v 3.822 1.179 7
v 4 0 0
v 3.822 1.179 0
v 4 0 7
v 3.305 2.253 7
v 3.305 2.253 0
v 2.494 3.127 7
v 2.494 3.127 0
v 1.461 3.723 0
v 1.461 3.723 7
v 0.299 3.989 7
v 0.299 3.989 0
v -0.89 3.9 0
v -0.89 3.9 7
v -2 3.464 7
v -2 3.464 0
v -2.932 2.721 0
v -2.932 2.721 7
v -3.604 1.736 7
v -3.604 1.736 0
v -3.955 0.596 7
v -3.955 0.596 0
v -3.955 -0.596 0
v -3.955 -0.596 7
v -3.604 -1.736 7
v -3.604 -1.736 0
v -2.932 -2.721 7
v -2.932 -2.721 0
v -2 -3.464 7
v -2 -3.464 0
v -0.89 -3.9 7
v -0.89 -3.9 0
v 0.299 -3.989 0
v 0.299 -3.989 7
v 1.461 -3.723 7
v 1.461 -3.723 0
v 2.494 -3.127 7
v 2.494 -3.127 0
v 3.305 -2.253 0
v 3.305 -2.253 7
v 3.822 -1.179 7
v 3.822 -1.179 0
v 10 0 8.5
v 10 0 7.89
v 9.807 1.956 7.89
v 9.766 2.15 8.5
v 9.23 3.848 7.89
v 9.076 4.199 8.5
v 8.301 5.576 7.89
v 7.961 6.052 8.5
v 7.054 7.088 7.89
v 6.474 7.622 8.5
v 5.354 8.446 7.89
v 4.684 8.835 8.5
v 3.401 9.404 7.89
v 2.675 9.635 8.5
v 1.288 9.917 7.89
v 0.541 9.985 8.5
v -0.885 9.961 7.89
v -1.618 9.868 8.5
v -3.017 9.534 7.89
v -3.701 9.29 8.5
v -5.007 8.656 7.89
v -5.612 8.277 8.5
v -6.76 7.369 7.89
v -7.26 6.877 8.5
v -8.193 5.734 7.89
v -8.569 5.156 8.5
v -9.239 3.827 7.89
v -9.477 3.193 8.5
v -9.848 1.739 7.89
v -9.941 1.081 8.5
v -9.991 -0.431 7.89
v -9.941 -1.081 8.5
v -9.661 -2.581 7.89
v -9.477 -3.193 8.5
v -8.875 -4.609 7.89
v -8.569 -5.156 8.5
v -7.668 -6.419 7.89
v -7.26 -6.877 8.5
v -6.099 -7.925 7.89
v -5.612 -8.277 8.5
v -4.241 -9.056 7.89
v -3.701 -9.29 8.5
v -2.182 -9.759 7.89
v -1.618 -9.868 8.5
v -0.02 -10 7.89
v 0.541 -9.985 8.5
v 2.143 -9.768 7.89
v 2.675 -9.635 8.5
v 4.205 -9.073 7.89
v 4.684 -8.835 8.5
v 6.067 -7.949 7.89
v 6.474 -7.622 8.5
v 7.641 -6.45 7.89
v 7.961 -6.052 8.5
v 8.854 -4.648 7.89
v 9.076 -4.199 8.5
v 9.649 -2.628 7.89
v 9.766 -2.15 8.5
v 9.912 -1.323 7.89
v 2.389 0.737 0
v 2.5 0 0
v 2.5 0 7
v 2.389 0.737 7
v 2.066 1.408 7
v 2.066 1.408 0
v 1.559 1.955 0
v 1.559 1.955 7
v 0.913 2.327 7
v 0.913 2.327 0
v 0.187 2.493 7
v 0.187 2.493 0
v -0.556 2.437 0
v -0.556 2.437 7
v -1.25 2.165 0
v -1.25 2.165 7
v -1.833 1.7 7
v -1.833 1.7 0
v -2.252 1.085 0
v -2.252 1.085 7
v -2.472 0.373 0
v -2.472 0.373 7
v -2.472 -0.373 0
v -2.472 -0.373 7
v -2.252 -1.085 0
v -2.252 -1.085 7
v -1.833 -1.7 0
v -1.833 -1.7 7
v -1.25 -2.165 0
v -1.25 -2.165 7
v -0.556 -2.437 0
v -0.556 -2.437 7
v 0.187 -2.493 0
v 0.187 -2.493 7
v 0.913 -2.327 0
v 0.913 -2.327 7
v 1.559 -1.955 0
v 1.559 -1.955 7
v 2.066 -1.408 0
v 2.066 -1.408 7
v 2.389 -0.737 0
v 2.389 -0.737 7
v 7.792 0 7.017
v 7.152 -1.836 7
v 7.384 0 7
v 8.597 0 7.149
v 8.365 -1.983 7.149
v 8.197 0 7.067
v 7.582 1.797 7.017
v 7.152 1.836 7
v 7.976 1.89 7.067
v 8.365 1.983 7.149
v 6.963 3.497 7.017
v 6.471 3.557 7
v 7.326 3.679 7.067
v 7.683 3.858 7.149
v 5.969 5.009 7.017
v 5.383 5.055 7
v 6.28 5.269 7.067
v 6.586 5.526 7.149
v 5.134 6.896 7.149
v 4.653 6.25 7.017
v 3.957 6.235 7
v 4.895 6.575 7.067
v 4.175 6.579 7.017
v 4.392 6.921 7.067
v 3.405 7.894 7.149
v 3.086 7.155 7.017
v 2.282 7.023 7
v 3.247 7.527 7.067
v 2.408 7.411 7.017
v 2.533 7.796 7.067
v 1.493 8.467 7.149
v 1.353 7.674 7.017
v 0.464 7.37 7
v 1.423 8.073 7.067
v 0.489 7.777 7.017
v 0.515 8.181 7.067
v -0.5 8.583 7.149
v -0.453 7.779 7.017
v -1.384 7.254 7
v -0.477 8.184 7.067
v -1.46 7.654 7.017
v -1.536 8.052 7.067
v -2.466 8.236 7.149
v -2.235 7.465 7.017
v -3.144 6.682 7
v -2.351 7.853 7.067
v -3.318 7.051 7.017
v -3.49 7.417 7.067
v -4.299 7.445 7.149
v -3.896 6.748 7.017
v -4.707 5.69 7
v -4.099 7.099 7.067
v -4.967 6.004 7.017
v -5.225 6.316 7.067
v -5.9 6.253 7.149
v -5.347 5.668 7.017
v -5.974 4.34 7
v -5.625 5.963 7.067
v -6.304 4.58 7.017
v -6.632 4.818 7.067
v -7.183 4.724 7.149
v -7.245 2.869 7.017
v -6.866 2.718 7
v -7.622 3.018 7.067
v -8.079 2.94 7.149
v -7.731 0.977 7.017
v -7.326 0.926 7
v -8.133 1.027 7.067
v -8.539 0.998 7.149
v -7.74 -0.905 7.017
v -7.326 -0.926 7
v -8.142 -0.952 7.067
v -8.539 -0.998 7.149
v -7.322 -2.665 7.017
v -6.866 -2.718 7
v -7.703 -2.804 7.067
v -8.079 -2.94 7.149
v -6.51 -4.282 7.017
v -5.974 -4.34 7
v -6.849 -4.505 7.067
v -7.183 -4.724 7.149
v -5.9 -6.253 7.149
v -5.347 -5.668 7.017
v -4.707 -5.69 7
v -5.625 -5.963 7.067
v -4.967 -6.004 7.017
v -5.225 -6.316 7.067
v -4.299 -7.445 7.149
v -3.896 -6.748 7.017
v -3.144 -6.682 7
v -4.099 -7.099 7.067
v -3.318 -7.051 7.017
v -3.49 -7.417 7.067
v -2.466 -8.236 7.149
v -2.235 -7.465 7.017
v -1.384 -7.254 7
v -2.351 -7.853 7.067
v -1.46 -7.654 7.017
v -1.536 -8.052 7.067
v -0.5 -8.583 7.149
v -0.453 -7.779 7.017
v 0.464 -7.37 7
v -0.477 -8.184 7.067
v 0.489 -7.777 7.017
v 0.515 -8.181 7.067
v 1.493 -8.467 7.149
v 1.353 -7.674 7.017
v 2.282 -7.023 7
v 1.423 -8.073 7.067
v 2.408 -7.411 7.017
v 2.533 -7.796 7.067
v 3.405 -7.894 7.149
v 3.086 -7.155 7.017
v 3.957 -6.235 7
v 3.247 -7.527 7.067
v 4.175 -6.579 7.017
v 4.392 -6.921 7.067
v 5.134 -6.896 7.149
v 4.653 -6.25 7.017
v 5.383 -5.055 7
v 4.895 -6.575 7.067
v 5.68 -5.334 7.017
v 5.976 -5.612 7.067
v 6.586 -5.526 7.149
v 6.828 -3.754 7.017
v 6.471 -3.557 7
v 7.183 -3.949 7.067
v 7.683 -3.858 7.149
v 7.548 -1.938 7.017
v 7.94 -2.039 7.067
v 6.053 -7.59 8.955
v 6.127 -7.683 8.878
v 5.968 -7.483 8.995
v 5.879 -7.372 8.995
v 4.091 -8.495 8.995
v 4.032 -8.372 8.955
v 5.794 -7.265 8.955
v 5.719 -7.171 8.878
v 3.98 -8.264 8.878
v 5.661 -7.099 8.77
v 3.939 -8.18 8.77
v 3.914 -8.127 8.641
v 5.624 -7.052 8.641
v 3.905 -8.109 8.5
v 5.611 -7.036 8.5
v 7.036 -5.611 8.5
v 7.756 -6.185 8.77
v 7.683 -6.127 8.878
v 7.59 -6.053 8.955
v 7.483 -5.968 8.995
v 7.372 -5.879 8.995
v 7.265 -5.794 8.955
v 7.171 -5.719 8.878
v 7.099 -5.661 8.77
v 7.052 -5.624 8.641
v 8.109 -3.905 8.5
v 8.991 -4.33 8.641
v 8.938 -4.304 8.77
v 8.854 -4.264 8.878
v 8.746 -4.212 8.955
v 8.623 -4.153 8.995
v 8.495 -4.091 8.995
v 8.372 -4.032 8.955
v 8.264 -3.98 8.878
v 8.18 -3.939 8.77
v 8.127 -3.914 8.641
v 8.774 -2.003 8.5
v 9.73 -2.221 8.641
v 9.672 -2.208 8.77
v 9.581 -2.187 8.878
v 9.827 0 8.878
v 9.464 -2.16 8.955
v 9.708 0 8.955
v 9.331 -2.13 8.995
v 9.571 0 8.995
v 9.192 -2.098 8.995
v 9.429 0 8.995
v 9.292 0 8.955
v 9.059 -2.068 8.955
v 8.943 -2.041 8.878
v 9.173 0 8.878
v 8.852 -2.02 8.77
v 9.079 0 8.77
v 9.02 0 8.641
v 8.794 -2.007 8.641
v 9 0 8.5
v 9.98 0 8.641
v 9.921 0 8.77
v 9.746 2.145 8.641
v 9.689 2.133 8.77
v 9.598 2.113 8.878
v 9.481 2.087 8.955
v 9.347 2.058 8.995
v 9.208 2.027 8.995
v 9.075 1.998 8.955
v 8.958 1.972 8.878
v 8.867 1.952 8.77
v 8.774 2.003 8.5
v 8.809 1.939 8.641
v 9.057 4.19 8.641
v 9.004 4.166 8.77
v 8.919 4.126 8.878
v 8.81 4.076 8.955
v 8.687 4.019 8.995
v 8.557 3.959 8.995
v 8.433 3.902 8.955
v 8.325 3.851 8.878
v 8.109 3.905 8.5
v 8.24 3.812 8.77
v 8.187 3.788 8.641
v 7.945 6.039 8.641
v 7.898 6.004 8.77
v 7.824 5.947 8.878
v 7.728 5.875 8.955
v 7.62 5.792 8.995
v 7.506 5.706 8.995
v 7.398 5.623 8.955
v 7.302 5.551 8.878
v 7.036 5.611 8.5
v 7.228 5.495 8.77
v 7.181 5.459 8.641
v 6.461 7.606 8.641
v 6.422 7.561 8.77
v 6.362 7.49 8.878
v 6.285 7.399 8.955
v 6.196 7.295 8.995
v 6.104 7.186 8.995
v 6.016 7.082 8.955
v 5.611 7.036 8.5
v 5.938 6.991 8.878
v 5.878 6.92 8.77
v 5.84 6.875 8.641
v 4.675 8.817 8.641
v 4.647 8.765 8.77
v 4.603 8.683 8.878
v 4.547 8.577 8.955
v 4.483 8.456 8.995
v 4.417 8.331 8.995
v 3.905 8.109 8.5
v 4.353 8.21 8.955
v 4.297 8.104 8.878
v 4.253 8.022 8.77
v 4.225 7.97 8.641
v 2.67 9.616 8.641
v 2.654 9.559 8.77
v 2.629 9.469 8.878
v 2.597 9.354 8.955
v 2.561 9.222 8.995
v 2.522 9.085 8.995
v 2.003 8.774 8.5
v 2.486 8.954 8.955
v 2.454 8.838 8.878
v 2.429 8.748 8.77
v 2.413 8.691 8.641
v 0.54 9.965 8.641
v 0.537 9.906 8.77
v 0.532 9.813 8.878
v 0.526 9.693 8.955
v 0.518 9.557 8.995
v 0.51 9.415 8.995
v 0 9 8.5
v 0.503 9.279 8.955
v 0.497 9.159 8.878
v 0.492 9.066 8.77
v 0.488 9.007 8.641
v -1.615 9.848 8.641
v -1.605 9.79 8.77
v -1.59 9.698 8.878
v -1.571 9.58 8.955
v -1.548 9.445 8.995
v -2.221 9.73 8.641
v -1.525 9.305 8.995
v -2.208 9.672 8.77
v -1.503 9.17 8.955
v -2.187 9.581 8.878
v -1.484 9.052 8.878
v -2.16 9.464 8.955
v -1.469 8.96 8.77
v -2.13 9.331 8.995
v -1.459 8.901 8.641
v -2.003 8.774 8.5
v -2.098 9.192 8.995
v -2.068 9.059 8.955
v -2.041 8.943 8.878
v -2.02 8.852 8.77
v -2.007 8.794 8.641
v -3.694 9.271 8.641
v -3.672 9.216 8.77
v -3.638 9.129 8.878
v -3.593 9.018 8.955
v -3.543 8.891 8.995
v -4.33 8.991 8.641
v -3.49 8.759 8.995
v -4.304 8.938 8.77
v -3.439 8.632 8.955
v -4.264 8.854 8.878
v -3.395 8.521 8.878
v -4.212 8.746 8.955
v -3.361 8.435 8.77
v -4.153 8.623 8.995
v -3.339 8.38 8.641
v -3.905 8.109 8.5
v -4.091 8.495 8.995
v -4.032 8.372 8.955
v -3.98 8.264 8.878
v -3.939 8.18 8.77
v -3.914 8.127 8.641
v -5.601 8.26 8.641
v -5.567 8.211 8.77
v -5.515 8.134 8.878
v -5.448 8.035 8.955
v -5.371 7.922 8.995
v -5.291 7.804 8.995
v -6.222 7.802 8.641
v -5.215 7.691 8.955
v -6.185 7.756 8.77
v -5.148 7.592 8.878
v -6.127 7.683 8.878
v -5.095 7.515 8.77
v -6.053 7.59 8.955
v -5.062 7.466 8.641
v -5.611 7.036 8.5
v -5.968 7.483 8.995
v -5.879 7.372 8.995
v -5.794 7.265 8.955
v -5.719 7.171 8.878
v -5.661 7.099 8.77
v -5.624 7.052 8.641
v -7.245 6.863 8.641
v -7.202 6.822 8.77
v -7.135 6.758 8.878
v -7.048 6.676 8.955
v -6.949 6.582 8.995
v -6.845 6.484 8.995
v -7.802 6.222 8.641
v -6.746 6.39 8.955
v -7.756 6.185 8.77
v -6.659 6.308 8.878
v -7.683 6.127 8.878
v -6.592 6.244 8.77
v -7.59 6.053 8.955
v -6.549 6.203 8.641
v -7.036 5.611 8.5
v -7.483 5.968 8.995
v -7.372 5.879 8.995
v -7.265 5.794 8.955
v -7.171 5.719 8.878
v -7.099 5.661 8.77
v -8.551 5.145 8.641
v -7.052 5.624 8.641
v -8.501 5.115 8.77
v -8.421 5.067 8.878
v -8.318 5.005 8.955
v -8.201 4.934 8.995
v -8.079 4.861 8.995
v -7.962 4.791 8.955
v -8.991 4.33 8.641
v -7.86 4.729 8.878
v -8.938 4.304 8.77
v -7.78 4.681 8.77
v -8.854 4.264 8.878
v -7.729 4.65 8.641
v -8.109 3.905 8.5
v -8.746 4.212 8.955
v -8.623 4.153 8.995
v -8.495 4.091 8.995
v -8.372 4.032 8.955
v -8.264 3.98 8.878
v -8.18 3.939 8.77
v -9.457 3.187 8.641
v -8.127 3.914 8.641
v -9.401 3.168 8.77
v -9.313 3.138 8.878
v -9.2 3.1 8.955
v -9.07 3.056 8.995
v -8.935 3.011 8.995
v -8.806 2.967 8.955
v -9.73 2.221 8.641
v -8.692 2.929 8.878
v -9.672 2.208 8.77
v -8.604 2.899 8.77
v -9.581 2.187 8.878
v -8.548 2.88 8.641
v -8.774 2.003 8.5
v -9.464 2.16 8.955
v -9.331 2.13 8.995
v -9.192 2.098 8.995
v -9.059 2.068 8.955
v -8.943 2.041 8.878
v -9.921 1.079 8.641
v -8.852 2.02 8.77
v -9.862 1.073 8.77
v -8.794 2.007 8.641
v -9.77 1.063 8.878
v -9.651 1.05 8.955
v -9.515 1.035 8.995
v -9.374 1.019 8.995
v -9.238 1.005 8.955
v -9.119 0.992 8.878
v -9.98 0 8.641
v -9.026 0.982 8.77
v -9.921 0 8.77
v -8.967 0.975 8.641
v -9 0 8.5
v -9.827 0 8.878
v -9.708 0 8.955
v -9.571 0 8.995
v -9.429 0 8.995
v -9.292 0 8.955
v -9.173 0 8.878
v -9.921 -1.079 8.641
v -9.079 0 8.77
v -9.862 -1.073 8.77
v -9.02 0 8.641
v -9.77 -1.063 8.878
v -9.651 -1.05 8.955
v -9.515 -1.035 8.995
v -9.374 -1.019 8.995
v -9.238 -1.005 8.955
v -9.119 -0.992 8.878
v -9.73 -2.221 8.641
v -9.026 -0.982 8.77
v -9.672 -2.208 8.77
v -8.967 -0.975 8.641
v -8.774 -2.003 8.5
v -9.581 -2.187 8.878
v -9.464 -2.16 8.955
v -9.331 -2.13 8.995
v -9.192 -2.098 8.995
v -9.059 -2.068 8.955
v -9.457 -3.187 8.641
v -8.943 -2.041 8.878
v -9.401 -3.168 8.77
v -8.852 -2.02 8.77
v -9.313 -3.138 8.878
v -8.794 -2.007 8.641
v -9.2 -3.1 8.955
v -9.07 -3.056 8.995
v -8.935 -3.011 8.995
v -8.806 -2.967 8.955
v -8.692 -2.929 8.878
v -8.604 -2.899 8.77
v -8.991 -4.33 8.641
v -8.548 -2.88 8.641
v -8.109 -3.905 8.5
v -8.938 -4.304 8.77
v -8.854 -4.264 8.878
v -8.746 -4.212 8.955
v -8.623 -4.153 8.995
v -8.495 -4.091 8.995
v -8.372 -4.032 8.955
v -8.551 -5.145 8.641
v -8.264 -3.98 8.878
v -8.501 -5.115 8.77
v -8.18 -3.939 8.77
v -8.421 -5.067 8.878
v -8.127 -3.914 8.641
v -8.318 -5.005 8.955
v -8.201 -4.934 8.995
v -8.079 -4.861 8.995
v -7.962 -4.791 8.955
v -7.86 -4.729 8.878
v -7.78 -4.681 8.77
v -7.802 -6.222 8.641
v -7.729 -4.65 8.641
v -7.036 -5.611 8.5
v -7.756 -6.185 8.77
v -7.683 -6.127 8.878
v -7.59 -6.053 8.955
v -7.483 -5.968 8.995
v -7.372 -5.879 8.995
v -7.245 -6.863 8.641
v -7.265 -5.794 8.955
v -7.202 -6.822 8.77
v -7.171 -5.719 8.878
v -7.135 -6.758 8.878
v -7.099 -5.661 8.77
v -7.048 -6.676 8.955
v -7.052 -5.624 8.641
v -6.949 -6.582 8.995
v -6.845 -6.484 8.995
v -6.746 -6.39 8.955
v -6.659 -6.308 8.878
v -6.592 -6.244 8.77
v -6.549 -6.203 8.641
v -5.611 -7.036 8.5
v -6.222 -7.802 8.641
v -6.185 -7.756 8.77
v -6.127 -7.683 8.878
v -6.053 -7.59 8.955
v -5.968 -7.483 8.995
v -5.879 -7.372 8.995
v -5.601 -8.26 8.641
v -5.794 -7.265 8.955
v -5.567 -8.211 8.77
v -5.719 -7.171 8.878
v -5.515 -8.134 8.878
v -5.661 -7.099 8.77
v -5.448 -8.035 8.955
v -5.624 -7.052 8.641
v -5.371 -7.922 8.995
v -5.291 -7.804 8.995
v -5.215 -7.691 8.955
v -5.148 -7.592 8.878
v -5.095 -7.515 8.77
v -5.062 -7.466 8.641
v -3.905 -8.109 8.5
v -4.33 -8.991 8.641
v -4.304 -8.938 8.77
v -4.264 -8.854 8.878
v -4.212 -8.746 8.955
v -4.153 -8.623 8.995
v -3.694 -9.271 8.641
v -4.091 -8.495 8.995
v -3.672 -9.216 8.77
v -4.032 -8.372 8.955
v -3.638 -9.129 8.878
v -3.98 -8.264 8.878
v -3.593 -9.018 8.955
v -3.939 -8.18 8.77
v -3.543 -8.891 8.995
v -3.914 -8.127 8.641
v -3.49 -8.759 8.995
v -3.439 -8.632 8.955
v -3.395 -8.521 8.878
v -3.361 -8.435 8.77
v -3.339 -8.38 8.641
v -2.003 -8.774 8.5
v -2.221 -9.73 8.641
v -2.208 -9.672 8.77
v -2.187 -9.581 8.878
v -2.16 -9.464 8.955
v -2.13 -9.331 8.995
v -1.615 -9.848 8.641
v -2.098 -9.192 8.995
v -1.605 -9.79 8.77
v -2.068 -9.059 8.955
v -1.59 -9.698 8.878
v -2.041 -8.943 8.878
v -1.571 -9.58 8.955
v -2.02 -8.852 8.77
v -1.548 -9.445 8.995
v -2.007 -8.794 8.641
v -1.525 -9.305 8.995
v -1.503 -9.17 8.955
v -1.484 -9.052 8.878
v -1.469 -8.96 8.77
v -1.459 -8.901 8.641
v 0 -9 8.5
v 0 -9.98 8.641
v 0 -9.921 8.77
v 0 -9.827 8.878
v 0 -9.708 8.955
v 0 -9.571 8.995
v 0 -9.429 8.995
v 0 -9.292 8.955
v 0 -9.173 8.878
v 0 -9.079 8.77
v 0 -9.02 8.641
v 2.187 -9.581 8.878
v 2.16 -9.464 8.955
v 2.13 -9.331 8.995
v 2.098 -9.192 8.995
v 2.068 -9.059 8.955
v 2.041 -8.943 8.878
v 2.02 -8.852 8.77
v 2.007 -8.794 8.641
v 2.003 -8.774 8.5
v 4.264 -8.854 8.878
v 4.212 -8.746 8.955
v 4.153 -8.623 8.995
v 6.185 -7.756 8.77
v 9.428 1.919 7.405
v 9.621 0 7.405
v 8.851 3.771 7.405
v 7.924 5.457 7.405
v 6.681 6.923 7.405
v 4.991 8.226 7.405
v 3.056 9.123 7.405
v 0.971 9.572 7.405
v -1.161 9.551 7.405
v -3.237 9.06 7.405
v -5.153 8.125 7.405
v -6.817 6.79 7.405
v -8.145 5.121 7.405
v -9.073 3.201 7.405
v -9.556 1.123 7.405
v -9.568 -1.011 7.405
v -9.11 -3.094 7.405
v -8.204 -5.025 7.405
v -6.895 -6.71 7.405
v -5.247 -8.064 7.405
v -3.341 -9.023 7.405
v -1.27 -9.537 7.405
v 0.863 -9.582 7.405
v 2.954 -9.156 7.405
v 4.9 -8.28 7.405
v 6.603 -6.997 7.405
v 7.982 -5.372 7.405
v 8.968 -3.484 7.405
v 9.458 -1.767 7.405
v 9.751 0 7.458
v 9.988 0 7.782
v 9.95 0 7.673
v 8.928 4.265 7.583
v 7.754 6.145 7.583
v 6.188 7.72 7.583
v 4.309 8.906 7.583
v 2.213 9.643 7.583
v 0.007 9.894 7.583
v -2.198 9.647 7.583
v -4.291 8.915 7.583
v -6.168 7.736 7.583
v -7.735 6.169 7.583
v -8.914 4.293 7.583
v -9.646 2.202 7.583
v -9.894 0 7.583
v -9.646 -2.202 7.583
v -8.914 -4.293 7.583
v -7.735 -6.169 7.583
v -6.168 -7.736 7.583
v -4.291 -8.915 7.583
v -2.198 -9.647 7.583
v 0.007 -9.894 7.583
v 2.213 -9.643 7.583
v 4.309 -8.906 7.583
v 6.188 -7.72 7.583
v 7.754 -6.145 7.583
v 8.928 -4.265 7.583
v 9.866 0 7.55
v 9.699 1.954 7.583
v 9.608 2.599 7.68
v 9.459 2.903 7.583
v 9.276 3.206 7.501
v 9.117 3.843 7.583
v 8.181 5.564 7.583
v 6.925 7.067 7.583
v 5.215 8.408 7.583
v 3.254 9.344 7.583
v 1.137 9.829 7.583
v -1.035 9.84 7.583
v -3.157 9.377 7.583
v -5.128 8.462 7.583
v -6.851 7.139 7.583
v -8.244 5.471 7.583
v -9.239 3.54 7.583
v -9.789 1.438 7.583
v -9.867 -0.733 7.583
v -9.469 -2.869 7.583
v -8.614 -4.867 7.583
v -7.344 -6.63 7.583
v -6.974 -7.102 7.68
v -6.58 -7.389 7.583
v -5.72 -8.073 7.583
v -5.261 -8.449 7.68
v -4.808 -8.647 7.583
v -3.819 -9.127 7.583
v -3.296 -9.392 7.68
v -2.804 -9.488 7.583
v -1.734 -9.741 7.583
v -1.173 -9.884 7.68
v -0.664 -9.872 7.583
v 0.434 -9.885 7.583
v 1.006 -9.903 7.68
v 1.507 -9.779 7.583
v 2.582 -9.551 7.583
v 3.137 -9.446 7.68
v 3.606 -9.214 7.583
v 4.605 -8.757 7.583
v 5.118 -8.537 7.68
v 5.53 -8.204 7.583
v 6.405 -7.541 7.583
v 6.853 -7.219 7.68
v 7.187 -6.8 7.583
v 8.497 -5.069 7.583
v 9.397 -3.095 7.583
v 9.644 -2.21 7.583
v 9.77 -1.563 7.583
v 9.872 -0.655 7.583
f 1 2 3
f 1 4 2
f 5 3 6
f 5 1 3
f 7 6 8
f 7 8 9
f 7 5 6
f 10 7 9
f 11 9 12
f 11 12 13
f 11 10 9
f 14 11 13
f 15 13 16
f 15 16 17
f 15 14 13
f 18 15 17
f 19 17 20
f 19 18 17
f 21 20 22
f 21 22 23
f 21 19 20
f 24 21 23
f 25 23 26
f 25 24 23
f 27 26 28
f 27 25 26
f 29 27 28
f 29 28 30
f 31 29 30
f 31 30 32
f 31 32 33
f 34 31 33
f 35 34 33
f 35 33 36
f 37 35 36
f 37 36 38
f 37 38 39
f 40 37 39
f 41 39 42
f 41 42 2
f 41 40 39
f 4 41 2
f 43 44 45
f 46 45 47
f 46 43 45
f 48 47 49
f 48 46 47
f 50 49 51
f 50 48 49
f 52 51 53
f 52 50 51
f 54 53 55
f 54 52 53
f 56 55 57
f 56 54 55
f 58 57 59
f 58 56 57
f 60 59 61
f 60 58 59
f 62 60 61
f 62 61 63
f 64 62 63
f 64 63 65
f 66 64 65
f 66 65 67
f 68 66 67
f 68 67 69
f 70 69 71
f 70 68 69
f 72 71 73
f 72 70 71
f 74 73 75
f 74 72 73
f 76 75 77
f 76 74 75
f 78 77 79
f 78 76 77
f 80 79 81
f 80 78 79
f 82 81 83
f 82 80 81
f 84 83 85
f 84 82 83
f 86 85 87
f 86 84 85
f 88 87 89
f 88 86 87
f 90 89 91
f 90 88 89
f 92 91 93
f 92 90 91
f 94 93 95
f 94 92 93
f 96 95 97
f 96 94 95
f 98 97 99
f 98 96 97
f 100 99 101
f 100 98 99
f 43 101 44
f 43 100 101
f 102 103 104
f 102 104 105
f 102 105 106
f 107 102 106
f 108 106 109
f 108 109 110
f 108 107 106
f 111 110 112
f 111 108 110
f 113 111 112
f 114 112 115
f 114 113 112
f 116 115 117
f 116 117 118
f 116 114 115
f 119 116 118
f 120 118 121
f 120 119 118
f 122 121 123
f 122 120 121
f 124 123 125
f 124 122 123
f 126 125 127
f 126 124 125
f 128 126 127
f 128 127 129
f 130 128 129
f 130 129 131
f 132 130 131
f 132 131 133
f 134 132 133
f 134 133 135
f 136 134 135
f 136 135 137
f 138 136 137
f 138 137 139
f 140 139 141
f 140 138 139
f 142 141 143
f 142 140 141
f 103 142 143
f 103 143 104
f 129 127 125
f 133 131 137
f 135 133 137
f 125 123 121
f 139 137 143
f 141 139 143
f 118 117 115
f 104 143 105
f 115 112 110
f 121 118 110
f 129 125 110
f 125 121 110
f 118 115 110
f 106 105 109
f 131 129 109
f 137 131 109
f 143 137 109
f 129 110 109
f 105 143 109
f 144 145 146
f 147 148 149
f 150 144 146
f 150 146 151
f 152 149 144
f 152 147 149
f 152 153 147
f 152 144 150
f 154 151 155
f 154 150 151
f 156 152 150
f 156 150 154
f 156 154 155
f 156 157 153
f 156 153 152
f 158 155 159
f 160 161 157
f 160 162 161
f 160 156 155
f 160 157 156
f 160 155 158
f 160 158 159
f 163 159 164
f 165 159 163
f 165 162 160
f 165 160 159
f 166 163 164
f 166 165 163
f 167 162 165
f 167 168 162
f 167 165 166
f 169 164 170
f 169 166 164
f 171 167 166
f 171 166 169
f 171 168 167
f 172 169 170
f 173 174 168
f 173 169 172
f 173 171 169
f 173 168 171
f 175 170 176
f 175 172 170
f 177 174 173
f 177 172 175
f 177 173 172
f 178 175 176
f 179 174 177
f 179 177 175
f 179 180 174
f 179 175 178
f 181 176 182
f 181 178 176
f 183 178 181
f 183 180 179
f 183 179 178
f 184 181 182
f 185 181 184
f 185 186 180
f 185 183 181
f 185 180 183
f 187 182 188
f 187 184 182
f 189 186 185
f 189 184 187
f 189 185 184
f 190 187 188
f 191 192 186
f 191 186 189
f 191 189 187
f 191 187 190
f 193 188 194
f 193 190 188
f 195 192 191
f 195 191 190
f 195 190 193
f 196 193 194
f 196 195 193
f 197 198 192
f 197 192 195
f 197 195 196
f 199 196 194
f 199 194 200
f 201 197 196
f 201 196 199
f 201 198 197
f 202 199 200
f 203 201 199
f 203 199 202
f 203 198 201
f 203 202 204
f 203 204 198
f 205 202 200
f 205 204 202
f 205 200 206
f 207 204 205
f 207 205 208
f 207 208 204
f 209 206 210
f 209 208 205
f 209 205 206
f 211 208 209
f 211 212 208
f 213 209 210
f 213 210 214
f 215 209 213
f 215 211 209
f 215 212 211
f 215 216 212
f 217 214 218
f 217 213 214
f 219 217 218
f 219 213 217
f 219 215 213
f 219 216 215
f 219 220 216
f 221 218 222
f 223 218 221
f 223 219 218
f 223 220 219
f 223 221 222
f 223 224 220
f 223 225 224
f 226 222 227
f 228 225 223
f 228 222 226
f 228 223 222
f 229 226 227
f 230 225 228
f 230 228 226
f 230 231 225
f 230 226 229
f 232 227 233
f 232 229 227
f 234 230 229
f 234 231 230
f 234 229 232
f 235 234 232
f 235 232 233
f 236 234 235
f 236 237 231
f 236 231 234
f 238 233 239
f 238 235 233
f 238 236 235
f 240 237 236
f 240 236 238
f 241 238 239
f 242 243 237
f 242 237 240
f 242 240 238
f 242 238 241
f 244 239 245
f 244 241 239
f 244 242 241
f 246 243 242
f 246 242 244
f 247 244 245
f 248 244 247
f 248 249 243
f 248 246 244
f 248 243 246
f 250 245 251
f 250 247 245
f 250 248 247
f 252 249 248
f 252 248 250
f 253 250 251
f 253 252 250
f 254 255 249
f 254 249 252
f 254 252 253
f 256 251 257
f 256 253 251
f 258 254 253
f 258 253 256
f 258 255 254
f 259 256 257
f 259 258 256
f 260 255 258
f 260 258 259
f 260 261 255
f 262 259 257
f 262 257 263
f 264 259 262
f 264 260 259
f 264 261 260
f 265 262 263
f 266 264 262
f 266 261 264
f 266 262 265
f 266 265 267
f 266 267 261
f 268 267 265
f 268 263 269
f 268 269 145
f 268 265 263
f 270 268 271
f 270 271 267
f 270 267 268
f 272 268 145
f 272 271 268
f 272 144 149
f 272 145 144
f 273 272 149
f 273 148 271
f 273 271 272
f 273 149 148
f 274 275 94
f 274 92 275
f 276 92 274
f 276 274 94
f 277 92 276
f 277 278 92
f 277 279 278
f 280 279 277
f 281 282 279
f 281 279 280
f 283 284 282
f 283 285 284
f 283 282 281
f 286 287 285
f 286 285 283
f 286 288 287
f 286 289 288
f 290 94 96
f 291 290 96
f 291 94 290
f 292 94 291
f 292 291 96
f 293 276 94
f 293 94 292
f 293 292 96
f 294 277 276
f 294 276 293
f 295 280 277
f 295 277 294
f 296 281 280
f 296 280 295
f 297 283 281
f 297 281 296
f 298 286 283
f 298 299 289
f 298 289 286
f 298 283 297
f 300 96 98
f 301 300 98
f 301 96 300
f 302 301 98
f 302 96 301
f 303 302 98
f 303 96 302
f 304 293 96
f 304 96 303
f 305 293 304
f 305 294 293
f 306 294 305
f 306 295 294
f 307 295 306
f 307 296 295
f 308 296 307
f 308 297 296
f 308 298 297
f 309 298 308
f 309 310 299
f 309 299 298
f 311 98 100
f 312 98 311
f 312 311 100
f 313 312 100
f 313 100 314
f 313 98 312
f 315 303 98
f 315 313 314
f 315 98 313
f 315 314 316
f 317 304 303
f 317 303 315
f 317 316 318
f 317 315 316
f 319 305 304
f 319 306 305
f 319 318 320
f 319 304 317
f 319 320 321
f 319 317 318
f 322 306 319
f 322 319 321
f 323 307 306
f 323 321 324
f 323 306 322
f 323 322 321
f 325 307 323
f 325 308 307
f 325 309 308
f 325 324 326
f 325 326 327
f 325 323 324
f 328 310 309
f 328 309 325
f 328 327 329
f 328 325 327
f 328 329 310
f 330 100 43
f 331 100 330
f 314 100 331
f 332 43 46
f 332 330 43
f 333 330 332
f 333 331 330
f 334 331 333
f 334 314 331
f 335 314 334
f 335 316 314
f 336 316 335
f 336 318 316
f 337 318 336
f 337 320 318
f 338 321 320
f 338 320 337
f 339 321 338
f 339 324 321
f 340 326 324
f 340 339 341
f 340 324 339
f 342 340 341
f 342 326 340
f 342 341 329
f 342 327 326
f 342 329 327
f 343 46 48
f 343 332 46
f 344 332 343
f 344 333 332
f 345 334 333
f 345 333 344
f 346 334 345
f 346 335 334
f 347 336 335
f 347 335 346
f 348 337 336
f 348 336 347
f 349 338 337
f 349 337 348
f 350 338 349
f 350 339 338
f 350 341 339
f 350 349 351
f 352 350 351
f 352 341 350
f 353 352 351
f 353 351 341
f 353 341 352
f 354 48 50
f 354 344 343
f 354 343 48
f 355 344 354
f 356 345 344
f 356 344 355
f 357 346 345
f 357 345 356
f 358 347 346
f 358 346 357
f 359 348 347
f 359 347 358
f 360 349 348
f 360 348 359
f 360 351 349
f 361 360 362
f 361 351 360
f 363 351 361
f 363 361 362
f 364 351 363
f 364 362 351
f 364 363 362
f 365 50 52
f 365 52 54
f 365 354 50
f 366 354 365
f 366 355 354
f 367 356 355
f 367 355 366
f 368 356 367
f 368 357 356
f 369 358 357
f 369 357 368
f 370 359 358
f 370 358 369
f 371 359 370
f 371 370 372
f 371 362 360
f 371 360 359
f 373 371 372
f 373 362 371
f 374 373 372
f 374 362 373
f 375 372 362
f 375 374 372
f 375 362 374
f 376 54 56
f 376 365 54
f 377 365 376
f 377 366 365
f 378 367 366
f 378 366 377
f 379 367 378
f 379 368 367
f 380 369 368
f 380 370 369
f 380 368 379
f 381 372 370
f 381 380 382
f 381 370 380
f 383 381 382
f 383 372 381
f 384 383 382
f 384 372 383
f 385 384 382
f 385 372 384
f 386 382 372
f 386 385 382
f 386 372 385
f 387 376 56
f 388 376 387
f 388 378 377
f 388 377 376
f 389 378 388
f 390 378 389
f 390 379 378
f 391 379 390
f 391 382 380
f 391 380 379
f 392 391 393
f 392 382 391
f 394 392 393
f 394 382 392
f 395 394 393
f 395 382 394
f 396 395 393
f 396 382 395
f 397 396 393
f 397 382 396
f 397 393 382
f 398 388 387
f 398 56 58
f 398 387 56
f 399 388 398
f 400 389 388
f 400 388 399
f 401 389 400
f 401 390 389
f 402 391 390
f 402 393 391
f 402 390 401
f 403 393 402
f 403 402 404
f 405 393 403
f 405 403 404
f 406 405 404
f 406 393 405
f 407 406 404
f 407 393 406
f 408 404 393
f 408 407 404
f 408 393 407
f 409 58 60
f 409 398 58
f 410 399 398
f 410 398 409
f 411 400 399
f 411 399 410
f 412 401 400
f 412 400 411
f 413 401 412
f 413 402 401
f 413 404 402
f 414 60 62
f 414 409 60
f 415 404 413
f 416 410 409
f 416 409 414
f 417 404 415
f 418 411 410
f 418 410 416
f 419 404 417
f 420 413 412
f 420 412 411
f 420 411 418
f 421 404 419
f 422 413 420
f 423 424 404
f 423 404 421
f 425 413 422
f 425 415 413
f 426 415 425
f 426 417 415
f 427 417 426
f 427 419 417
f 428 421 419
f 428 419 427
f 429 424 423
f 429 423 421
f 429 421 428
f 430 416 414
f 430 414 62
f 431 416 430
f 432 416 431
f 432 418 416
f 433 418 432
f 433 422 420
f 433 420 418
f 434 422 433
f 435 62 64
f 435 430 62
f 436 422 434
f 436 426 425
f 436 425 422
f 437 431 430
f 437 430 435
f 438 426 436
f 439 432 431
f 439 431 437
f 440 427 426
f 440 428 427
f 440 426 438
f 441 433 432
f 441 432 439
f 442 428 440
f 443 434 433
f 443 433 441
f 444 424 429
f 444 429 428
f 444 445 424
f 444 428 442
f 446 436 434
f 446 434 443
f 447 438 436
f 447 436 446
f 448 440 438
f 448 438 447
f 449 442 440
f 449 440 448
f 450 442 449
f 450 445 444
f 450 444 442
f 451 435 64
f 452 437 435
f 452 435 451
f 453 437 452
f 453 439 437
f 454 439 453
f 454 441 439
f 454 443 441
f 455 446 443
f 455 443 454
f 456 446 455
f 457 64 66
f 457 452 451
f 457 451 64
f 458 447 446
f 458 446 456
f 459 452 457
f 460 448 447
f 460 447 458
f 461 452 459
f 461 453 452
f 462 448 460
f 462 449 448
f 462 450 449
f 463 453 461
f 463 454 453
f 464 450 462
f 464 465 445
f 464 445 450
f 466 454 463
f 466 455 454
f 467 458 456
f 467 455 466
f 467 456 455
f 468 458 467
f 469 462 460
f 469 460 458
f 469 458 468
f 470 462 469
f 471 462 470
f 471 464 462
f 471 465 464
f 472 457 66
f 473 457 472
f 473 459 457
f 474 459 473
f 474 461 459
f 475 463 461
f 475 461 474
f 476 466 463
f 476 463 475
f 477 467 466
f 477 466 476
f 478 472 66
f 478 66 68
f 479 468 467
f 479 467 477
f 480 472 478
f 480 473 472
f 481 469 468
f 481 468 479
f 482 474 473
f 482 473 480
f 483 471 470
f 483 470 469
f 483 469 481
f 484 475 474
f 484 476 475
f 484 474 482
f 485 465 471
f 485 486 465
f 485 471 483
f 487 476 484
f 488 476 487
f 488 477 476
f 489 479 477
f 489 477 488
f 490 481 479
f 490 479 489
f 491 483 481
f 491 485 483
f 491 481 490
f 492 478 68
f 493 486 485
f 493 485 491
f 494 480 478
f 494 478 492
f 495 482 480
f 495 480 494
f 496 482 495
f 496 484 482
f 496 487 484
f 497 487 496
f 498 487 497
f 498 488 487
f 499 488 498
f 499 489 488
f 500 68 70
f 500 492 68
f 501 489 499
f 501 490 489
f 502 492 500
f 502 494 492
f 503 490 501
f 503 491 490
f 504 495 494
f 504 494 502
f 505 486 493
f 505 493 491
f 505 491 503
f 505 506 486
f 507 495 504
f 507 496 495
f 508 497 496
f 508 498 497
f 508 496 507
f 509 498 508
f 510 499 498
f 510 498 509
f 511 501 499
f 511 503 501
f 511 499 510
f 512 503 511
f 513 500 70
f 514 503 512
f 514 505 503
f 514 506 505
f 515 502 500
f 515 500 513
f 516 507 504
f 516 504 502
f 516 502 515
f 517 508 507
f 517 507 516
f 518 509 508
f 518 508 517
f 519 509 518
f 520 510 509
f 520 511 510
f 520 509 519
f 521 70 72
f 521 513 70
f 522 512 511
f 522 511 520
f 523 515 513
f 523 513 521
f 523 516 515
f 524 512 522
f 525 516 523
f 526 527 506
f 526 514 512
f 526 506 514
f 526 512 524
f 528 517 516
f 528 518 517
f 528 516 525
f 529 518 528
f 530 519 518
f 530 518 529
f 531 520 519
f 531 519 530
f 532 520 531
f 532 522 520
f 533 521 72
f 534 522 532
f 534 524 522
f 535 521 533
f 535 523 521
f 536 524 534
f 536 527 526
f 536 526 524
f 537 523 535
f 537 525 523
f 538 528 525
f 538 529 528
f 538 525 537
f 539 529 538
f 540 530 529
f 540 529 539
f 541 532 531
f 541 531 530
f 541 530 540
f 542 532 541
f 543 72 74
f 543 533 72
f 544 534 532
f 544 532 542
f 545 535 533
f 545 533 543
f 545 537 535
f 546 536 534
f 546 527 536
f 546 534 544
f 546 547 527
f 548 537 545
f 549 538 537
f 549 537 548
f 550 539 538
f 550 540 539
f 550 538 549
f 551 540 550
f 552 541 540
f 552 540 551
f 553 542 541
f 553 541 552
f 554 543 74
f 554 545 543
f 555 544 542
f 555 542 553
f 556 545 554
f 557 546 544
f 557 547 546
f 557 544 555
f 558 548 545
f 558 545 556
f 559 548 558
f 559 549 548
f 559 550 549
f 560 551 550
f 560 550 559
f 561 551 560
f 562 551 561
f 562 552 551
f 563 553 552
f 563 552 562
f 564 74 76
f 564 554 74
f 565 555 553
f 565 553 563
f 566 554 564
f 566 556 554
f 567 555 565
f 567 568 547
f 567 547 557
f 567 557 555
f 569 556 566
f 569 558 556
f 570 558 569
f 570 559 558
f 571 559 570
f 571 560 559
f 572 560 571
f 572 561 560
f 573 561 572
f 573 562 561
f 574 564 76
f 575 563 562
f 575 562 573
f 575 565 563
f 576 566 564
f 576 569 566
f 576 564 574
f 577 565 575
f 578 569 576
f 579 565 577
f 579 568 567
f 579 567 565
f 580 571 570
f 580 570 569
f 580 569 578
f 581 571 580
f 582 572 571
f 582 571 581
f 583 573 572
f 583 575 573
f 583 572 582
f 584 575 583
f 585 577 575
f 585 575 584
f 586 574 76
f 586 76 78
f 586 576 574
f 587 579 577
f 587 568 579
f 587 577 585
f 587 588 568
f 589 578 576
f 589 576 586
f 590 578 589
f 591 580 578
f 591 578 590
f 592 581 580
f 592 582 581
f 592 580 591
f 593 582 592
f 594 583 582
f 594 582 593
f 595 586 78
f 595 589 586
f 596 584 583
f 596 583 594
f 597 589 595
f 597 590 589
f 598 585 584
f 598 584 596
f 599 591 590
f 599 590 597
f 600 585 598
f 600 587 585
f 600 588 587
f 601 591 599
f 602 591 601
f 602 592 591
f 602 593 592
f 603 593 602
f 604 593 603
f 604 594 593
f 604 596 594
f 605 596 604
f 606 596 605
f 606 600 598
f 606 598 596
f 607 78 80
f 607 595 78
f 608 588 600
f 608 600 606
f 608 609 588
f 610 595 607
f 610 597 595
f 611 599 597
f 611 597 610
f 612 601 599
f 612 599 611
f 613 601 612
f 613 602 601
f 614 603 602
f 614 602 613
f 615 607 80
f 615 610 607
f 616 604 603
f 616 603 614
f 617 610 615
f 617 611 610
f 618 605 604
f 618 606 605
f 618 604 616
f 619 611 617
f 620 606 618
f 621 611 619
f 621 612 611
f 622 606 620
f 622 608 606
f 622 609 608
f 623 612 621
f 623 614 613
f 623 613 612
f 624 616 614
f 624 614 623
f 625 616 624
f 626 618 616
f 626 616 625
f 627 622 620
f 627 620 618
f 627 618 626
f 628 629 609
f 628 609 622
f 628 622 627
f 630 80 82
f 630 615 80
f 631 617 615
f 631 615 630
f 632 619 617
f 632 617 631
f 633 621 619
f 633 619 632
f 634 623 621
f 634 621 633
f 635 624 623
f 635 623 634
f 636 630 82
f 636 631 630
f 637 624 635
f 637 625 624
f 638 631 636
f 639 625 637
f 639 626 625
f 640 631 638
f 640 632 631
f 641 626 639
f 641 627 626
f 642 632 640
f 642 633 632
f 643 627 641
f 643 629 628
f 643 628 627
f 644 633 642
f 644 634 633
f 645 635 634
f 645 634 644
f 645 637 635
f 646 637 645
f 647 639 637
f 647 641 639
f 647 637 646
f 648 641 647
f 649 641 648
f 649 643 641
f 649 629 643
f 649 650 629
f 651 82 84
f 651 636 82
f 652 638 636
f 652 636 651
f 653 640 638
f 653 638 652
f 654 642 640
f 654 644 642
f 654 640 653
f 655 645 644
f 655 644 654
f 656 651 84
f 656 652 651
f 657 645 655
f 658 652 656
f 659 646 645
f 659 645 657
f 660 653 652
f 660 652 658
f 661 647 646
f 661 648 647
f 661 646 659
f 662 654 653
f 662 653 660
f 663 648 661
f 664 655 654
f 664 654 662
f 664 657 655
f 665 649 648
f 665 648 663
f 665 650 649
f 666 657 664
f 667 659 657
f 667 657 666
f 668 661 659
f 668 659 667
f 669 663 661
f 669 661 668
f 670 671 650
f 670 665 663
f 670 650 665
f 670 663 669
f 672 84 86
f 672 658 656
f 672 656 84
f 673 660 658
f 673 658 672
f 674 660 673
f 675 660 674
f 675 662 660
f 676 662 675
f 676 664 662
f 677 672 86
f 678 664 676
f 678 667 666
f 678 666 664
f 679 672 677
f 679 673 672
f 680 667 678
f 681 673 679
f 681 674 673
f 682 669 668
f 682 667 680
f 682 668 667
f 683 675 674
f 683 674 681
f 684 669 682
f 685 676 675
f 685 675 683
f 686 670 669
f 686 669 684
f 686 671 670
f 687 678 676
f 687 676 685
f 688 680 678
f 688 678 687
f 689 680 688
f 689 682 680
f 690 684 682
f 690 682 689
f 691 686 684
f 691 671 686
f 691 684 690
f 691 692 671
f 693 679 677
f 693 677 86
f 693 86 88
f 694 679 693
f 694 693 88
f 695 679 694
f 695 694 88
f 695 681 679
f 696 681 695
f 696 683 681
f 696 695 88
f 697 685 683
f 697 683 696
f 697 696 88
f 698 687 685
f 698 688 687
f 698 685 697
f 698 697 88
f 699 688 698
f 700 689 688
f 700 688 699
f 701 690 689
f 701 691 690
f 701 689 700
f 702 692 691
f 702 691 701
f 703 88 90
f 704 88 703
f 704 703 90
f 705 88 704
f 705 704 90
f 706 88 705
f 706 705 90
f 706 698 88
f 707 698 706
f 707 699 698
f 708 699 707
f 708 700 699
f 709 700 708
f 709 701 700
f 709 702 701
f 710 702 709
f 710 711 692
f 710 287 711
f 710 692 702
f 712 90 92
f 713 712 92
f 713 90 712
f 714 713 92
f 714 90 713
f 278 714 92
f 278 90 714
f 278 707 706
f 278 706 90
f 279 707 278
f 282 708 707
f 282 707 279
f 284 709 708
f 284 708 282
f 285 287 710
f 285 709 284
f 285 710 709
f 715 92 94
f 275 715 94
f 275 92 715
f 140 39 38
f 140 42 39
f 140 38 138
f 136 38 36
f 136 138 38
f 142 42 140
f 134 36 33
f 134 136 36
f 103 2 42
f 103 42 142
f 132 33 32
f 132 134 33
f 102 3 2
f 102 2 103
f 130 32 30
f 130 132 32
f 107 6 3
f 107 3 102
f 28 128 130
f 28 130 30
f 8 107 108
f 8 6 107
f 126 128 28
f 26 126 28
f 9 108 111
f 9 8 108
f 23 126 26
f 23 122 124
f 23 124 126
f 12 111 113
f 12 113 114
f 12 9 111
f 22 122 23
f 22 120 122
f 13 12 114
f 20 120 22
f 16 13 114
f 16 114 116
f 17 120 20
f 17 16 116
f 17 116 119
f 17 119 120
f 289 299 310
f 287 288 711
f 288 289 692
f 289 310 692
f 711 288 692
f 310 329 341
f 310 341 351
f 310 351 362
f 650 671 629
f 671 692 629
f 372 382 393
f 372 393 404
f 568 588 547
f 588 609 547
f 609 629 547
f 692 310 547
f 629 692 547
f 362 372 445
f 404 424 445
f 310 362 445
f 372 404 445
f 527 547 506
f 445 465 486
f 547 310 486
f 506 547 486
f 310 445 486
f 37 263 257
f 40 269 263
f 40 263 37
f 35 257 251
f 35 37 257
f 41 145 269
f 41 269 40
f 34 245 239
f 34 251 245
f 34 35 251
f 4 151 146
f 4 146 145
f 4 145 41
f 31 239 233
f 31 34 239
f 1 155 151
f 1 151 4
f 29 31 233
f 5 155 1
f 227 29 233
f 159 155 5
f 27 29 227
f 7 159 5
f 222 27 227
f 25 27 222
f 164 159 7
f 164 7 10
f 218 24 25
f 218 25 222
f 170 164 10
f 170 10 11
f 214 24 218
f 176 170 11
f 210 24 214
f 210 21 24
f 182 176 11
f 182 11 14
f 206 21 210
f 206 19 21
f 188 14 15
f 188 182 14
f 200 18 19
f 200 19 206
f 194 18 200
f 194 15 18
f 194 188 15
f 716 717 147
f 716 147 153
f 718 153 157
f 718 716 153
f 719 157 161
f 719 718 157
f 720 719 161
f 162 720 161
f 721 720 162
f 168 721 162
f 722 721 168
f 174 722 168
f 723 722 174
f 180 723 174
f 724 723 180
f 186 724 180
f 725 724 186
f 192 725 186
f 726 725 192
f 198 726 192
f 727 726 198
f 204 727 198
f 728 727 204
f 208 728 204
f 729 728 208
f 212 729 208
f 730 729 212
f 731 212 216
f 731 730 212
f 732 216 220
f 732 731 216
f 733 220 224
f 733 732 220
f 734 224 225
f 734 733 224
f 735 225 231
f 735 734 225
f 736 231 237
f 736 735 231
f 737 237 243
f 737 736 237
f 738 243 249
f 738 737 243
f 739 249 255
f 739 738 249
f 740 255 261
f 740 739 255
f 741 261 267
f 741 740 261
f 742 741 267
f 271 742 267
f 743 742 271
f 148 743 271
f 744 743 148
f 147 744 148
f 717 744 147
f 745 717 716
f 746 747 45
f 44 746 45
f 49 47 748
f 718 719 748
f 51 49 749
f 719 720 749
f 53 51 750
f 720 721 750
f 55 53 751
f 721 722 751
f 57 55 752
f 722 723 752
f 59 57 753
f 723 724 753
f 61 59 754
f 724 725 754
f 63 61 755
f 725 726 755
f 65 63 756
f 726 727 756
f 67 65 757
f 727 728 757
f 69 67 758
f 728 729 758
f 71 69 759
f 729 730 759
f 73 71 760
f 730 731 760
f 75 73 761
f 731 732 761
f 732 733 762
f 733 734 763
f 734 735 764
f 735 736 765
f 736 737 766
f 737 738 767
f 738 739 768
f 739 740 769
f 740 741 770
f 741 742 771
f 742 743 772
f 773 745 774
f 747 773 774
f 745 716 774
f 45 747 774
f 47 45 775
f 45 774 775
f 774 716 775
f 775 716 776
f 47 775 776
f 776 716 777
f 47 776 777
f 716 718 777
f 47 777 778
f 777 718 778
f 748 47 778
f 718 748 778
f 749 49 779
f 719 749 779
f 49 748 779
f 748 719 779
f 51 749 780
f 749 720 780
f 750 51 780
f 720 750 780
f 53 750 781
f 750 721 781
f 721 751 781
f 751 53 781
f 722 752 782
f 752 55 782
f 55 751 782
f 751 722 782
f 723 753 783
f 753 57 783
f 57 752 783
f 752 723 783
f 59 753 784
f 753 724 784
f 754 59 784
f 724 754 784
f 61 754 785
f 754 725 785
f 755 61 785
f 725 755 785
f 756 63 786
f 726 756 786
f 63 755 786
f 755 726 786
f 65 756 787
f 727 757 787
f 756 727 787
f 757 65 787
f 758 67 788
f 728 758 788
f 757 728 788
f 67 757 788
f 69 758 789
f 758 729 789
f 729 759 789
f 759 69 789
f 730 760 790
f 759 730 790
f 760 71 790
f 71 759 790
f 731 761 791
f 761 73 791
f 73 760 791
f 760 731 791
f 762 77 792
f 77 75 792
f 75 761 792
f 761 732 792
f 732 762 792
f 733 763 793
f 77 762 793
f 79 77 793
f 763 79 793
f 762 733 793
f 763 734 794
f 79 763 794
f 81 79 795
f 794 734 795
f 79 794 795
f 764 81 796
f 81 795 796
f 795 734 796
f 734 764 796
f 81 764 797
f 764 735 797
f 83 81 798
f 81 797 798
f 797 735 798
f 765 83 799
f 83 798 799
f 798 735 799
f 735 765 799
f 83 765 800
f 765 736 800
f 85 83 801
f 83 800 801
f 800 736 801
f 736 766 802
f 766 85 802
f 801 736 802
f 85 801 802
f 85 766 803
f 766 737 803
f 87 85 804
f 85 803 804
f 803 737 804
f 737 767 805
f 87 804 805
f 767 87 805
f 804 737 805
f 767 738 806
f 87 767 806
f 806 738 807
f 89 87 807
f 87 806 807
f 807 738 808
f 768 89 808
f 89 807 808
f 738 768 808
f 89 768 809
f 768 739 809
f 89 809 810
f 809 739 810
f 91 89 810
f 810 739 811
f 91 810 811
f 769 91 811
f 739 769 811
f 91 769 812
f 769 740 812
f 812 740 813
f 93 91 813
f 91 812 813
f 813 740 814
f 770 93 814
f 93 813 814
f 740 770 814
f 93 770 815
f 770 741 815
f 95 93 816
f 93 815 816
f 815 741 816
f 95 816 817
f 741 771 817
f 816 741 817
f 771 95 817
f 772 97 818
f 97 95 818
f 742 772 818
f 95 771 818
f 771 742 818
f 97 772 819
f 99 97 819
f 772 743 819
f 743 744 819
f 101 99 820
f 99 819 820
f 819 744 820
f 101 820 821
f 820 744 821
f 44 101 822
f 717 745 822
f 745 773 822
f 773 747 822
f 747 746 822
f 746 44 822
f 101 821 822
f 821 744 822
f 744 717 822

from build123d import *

# Parameters (mm, degrees)
CYLINDER_R     = 2.5
CYLINDER_DEPTH = 7
FILLET_1_R     = 5
FILLET_2_R     = 0.5


with BuildPart() as pocket:
    # Cylinder → Cylinder (new body)
    with BuildSketch(Plane.XY):
        Circle(CYLINDER_R)
    extrude(amount=CYLINDER_DEPTH)


with BuildPart() as handle:
    # Sketch → Revolution (revolve)
    with BuildSketch(Plane.XZ):
        with BuildLine():
            Line((0, 0), (4, 0))
            Line((4, 0), (4, 7))
            Line((4, 7), (8, 7))
            Line((8, 7), (10, 7.5))
            Line((10, 7.5), (10, 8.499999))
            ThreePointArc((10, 8.499999), (9.500011, 9), (9, 8.500022))
            Line((9, 8.5), (9, 8.500022))
            Line((0, 8.5), (9, 8.5))
            Line((0, 8.5), (0, 0))
        make_face()
    revolve(axis=Axis((0, 0, 0), (0, 0, 1)))

    # Fillet 1
    fillet_1_edges = [handle.edges().sort_by_distance(p)[0] for p in [
        (-8, 0, 7),
    ]]
    fillet(fillet_1_edges, radius=FILLET_1_R)

    # Fillet 2
    fillet_2_edges = [handle.edges().sort_by_distance(p)[0] for p in [
        (-10, 0, 7.5),
    ]]
    fillet(fillet_2_edges, radius=FILLET_2_R)

    # Cut: cut Pocket
    add(pocket.part, mode=Mode.SUBTRACT)


solid = handle.part
